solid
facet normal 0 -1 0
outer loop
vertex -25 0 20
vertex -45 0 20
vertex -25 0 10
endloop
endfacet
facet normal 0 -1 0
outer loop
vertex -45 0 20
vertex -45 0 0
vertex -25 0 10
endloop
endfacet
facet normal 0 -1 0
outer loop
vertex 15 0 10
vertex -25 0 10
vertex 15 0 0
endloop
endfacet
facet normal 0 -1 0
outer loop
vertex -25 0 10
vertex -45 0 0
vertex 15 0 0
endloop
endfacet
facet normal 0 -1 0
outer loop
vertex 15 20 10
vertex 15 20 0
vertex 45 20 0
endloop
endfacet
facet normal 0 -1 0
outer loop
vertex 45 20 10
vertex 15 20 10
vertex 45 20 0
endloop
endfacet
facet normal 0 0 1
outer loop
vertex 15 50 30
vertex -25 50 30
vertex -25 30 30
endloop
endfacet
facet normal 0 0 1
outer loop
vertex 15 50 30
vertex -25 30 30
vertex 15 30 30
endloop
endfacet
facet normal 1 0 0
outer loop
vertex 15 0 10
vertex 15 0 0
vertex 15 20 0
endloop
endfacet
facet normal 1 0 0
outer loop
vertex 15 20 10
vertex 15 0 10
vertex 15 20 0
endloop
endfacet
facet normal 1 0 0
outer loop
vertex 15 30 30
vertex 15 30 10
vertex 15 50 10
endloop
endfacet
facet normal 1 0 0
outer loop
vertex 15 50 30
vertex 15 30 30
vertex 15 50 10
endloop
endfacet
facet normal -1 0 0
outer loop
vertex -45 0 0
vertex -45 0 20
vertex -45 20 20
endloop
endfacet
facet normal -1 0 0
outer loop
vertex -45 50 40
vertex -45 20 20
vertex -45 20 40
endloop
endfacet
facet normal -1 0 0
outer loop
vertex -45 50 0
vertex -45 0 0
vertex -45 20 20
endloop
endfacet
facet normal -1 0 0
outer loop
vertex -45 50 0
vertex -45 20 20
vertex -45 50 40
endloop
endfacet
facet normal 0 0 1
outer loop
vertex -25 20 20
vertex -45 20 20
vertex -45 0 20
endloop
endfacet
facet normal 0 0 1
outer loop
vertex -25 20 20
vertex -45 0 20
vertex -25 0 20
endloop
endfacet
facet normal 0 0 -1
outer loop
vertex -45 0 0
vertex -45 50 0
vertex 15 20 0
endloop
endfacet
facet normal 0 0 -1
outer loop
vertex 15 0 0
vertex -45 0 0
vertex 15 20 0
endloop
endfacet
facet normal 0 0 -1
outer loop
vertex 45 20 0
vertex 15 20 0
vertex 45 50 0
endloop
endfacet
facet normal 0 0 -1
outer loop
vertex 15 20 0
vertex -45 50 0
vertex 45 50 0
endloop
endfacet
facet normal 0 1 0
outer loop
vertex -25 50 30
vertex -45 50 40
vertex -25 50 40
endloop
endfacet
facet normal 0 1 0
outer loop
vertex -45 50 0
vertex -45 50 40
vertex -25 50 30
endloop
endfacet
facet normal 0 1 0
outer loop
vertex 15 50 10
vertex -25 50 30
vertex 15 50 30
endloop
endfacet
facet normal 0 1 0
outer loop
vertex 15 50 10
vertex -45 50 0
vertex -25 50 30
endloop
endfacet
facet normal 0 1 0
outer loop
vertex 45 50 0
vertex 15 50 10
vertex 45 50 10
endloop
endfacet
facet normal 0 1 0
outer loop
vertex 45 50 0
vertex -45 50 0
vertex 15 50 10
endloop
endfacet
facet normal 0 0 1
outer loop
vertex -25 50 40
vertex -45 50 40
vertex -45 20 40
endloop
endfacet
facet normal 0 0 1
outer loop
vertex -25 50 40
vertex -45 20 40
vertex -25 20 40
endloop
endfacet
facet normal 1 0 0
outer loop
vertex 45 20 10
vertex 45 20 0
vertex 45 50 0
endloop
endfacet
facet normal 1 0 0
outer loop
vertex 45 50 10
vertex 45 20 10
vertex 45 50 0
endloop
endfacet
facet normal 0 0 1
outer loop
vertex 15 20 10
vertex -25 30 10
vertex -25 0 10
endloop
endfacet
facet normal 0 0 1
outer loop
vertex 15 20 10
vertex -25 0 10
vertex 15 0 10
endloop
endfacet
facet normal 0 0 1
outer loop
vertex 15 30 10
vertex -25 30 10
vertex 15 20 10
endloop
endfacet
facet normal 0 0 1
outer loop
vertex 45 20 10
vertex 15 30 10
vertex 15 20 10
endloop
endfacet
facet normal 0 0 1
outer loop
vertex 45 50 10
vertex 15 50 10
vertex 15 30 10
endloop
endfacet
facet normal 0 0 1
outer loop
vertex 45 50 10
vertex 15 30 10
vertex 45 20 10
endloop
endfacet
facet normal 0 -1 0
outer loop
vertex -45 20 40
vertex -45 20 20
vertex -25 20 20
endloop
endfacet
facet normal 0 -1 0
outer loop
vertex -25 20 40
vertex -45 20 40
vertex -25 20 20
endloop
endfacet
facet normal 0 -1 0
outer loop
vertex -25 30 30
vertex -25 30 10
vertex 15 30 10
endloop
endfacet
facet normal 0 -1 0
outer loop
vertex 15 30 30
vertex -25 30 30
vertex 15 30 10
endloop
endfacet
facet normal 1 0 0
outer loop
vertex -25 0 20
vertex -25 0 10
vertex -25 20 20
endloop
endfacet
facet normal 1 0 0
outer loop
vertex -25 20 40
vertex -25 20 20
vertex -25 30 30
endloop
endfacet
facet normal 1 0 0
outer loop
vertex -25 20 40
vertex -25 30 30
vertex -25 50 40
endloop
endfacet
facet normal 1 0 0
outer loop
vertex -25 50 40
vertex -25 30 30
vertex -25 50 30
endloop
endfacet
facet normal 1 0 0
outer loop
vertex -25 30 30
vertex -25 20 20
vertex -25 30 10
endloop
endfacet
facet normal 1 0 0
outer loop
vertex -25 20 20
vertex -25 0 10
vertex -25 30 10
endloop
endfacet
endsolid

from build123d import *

# Parameters (mm, degrees)
PAD_DEPTH    = 10
SKETCH001_W  = 20
SKETCH001_H  = 50
PAD001_DEPTH = 10
SKETCH002_W  = 20
SKETCH002_H  = 30
PAD002_DEPTH = 20
SKETCH003_W  = 40
SKETCH003_H  = 20
PAD003_DEPTH = 20


with BuildPart() as part:
    # Sketch → Pad (new body)
    with BuildSketch(Plane.XY):
        Polygon((-45, 50), (-45, 0), (15, 0), (15, 20), (45, 20), (45, 50), align=None)
    extrude(amount=PAD_DEPTH)

    # Sketch001 → Pad001 (new body)
    with BuildSketch(Plane.XY.offset(10)):
        with Locations((-35, 25)):
            Rectangle(SKETCH001_W, SKETCH001_H)
    extrude(amount=PAD001_DEPTH)

    # Sketch002 → Pad002 (new body)
    with BuildSketch(Plane.XY.offset(20)):
        with Locations((-35, 35)):
            Rectangle(SKETCH002_W, SKETCH002_H)
    extrude(amount=PAD002_DEPTH)

    # Sketch003 → Pad003 (new body)
    with BuildSketch(Plane.XY.offset(10)):
        with Locations((-5, 40)):
            Rectangle(SKETCH003_W, SKETCH003_H)
    extrude(amount=PAD003_DEPTH)


solid = part.part
